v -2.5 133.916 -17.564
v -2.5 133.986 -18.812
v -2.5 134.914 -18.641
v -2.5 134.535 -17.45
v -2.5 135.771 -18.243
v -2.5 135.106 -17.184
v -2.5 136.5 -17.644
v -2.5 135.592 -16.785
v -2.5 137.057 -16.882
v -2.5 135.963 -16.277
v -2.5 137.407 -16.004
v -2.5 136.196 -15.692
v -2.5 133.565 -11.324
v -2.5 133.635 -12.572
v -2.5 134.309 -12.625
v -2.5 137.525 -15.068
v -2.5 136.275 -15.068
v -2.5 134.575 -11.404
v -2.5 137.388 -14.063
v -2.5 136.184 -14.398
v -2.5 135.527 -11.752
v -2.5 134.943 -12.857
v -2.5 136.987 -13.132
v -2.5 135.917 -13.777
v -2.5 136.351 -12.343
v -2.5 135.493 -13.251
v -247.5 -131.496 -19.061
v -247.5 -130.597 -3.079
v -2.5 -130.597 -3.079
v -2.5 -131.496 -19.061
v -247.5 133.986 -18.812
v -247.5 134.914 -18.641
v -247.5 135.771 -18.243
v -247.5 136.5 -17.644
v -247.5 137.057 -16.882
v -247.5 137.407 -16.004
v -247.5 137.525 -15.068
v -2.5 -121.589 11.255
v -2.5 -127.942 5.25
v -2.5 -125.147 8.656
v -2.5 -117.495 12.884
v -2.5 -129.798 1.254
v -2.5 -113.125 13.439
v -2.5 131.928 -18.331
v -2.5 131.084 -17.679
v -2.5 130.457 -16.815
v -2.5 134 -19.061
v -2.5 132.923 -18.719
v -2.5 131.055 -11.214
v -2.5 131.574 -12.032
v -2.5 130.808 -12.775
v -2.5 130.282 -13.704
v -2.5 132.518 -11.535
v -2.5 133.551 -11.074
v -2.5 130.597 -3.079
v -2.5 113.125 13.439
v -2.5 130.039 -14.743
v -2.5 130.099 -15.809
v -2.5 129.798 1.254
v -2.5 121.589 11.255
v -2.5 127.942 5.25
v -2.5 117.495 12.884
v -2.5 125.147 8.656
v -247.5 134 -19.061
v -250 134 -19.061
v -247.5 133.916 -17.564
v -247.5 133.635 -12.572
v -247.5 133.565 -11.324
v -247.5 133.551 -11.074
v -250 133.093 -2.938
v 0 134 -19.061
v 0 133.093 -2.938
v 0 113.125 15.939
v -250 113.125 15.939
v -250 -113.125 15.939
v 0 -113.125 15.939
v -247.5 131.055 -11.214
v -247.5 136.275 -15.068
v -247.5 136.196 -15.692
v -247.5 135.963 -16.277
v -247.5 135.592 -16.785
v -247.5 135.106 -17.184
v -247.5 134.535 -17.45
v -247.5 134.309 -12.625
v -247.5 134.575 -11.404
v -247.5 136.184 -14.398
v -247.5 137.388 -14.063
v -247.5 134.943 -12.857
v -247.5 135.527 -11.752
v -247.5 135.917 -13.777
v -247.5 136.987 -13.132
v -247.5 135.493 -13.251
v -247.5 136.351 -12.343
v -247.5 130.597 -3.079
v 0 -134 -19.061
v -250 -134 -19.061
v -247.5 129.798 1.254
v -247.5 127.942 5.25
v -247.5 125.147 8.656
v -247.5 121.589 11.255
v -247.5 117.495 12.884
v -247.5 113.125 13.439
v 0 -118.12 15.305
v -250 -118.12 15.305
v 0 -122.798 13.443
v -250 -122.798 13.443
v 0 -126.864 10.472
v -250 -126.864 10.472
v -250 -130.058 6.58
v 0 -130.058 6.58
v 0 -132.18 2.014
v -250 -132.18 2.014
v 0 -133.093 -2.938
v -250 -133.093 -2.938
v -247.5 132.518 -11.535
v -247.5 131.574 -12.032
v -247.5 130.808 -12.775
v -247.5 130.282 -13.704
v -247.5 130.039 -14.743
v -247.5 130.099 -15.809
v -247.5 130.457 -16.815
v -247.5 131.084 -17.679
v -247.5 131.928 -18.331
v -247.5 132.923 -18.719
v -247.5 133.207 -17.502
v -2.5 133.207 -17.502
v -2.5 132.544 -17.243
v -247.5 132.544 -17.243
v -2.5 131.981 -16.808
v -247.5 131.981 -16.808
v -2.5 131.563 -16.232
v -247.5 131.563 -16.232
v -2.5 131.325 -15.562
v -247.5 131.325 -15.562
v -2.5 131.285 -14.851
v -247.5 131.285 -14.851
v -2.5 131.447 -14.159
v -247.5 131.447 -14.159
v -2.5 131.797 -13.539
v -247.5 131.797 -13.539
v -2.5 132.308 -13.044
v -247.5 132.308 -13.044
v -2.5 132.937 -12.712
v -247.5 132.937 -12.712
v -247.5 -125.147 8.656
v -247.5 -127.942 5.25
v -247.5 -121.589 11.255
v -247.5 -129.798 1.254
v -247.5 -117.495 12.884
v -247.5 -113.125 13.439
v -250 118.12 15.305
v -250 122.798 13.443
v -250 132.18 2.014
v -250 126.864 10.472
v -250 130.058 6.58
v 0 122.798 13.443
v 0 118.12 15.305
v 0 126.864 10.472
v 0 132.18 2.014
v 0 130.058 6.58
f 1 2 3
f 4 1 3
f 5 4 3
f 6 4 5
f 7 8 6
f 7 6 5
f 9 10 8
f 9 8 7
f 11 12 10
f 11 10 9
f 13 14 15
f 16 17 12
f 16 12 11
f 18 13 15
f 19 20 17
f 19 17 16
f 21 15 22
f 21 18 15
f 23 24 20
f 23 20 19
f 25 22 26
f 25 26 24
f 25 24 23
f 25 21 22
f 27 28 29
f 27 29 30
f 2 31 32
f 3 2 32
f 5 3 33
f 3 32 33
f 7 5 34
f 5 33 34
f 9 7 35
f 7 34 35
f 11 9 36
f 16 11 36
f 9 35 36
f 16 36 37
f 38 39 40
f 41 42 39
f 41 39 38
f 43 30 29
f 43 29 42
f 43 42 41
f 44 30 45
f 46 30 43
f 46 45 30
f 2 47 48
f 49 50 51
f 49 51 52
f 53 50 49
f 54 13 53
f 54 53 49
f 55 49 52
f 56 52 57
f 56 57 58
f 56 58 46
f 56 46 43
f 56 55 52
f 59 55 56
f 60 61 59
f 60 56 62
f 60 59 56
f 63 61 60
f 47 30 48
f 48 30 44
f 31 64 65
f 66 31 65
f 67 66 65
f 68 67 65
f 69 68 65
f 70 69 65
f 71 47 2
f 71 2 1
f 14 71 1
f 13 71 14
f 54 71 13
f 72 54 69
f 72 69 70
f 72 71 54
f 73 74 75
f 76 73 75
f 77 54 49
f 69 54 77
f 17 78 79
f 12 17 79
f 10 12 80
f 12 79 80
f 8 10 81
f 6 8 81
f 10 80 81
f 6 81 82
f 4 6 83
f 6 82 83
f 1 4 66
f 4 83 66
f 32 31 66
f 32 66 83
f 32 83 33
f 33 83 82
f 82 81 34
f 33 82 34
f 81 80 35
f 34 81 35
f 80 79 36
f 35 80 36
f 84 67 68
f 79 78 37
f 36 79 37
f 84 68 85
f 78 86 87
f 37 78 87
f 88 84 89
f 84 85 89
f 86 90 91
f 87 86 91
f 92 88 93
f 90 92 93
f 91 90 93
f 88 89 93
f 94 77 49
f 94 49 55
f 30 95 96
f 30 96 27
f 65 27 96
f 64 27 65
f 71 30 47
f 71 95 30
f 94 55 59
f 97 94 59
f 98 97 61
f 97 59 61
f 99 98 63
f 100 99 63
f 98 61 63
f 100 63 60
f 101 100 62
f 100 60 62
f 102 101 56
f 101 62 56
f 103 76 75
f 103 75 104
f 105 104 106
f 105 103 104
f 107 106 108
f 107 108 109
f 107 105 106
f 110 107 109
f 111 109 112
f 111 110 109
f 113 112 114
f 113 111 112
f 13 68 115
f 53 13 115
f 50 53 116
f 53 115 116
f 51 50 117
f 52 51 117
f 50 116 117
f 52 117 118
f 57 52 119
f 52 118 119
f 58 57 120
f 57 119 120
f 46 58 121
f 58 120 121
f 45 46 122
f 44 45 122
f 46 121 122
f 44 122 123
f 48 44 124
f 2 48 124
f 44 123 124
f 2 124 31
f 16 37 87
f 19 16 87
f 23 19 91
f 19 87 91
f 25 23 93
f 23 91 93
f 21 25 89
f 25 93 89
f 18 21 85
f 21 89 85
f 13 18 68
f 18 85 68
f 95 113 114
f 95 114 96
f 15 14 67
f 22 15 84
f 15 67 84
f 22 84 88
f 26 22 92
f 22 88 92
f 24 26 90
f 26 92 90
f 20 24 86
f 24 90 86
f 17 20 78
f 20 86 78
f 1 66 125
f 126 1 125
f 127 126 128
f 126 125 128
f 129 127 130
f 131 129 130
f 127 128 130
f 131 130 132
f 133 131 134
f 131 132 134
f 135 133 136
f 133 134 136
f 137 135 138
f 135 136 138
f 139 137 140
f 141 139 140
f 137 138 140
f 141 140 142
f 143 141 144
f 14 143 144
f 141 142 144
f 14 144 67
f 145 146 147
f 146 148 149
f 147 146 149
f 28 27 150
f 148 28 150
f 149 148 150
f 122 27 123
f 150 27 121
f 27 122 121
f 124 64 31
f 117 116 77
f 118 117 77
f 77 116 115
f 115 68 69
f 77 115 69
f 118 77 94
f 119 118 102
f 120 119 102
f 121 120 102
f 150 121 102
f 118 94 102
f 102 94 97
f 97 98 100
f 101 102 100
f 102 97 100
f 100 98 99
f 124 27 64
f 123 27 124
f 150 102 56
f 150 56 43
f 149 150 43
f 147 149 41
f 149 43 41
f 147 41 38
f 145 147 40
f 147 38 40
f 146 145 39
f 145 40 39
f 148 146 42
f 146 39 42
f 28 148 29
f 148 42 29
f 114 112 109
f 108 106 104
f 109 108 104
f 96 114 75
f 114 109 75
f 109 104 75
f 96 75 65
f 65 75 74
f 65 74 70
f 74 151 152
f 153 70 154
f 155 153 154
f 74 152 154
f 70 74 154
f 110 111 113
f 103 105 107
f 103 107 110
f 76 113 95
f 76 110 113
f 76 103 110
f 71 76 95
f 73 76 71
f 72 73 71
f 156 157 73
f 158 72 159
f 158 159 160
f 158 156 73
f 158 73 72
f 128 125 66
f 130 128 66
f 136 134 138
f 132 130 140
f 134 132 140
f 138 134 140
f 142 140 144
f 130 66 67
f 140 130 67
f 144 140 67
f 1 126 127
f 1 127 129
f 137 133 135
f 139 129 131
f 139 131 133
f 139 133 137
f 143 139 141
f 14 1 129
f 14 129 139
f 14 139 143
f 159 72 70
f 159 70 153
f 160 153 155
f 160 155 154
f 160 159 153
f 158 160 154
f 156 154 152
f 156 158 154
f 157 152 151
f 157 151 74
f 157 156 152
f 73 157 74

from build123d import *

# Parameters (mm, degrees)
F1_DEPTH = 250
F2_T     = -2.5
F3_W     = 245
F3_H     = 8
F4_DEPTH = 267.5780191142
F6_DEPTH = 245


with BuildPart() as f1:
    # F0 (on Right) → F1 (new body)
    with BuildSketch(Plane.YZ):
        with BuildLine():
            Line((-134.0000000003, -19.0613823906), (133.9999999997, -19.0613823906))
            Line((133.9999999997, -19.0613823906), (133.0930686257, -2.9381579633))
            ThreePointArc((133.0930686257, -2.9381579633), (126.8639122094, 10.4724486347), (113.1246343635, 15.9386176094))
            Line((113.1246343635, 15.9386176094), (-113.1246343631, 15.9386176094))
            ThreePointArc((-113.1246343631, 15.9386176094), (-126.8639122086, 10.4724486351), (-133.0930686253, -2.9381579622))
            Line((-133.0930686253, -2.9381579622), (-134.0000000003, -19.0613823906))
        make_face()
    extrude(amount=-F1_DEPTH)

    # F2
    f2_openings = [f1.faces().sort_by_distance(p)[0] for p in [
        (-125, 0, -19.061382),
    ]]
    offset(amount=F2_T, openings=f2_openings)

    # F3 (on face) → F4 (cut, through all)
    with BuildSketch(Plane(origin=(0, 132.5085319634, 7.4536049229), x_dir=(-1, 0, 0), z_dir=(0, 0.9984217131, 0.0561612214))):
        with Locations((125, -22.5569017233)):
            Rectangle(F3_W, F3_H)
    extrude(amount=-F4_DEPTH, mode=Mode.SUBTRACT)

    # F5 (on face) → F6 (join)
    with BuildSketch(Plane.YZ.offset(-247.5)):
        with BuildLine():
            Line((133.6349520609, -12.5716412553), (133.5647505342, -11.3236141139))
            ThreePointArc((133.5647505342, -11.3236141139), (130.0312736901, -15.2783001182), (133.9859596944, -18.8117769623))
            Line((133.9859596944, -18.8117769623), (133.9157581677, -17.5637498209))
            ThreePointArc((133.9157581677, -17.5637498209), (131.2793008315, -15.2080985915), (133.6349520609, -12.5716412553))
        make_face()
        with BuildLine():
            ThreePointArc((133.9859596944, -18.8117769623), (136.5004484315, -17.6438101342), (137.5253551143, -15.0676955381))
            ThreePointArc((137.5253551143, -15.0676955381), (136.3514697104, -12.3426022209), (133.5647505342, -11.3236141139))
            Line((133.5647505342, -11.3236141139), (133.6349520609, -12.5716412553))
            ThreePointArc((133.6349520609, -12.5716412553), (135.492764845, -13.25096666), (136.2753551143, -15.0676955381))
            ThreePointArc((136.2753551143, -15.0676955381), (135.5920839925, -16.7851052689), (133.9157581677, -17.5637498209))
            Line((133.9157581677, -17.5637498209), (133.9859596944, -18.8117769623))
        make_face()
    extrude(amount=F6_DEPTH)


solid = f1.part
